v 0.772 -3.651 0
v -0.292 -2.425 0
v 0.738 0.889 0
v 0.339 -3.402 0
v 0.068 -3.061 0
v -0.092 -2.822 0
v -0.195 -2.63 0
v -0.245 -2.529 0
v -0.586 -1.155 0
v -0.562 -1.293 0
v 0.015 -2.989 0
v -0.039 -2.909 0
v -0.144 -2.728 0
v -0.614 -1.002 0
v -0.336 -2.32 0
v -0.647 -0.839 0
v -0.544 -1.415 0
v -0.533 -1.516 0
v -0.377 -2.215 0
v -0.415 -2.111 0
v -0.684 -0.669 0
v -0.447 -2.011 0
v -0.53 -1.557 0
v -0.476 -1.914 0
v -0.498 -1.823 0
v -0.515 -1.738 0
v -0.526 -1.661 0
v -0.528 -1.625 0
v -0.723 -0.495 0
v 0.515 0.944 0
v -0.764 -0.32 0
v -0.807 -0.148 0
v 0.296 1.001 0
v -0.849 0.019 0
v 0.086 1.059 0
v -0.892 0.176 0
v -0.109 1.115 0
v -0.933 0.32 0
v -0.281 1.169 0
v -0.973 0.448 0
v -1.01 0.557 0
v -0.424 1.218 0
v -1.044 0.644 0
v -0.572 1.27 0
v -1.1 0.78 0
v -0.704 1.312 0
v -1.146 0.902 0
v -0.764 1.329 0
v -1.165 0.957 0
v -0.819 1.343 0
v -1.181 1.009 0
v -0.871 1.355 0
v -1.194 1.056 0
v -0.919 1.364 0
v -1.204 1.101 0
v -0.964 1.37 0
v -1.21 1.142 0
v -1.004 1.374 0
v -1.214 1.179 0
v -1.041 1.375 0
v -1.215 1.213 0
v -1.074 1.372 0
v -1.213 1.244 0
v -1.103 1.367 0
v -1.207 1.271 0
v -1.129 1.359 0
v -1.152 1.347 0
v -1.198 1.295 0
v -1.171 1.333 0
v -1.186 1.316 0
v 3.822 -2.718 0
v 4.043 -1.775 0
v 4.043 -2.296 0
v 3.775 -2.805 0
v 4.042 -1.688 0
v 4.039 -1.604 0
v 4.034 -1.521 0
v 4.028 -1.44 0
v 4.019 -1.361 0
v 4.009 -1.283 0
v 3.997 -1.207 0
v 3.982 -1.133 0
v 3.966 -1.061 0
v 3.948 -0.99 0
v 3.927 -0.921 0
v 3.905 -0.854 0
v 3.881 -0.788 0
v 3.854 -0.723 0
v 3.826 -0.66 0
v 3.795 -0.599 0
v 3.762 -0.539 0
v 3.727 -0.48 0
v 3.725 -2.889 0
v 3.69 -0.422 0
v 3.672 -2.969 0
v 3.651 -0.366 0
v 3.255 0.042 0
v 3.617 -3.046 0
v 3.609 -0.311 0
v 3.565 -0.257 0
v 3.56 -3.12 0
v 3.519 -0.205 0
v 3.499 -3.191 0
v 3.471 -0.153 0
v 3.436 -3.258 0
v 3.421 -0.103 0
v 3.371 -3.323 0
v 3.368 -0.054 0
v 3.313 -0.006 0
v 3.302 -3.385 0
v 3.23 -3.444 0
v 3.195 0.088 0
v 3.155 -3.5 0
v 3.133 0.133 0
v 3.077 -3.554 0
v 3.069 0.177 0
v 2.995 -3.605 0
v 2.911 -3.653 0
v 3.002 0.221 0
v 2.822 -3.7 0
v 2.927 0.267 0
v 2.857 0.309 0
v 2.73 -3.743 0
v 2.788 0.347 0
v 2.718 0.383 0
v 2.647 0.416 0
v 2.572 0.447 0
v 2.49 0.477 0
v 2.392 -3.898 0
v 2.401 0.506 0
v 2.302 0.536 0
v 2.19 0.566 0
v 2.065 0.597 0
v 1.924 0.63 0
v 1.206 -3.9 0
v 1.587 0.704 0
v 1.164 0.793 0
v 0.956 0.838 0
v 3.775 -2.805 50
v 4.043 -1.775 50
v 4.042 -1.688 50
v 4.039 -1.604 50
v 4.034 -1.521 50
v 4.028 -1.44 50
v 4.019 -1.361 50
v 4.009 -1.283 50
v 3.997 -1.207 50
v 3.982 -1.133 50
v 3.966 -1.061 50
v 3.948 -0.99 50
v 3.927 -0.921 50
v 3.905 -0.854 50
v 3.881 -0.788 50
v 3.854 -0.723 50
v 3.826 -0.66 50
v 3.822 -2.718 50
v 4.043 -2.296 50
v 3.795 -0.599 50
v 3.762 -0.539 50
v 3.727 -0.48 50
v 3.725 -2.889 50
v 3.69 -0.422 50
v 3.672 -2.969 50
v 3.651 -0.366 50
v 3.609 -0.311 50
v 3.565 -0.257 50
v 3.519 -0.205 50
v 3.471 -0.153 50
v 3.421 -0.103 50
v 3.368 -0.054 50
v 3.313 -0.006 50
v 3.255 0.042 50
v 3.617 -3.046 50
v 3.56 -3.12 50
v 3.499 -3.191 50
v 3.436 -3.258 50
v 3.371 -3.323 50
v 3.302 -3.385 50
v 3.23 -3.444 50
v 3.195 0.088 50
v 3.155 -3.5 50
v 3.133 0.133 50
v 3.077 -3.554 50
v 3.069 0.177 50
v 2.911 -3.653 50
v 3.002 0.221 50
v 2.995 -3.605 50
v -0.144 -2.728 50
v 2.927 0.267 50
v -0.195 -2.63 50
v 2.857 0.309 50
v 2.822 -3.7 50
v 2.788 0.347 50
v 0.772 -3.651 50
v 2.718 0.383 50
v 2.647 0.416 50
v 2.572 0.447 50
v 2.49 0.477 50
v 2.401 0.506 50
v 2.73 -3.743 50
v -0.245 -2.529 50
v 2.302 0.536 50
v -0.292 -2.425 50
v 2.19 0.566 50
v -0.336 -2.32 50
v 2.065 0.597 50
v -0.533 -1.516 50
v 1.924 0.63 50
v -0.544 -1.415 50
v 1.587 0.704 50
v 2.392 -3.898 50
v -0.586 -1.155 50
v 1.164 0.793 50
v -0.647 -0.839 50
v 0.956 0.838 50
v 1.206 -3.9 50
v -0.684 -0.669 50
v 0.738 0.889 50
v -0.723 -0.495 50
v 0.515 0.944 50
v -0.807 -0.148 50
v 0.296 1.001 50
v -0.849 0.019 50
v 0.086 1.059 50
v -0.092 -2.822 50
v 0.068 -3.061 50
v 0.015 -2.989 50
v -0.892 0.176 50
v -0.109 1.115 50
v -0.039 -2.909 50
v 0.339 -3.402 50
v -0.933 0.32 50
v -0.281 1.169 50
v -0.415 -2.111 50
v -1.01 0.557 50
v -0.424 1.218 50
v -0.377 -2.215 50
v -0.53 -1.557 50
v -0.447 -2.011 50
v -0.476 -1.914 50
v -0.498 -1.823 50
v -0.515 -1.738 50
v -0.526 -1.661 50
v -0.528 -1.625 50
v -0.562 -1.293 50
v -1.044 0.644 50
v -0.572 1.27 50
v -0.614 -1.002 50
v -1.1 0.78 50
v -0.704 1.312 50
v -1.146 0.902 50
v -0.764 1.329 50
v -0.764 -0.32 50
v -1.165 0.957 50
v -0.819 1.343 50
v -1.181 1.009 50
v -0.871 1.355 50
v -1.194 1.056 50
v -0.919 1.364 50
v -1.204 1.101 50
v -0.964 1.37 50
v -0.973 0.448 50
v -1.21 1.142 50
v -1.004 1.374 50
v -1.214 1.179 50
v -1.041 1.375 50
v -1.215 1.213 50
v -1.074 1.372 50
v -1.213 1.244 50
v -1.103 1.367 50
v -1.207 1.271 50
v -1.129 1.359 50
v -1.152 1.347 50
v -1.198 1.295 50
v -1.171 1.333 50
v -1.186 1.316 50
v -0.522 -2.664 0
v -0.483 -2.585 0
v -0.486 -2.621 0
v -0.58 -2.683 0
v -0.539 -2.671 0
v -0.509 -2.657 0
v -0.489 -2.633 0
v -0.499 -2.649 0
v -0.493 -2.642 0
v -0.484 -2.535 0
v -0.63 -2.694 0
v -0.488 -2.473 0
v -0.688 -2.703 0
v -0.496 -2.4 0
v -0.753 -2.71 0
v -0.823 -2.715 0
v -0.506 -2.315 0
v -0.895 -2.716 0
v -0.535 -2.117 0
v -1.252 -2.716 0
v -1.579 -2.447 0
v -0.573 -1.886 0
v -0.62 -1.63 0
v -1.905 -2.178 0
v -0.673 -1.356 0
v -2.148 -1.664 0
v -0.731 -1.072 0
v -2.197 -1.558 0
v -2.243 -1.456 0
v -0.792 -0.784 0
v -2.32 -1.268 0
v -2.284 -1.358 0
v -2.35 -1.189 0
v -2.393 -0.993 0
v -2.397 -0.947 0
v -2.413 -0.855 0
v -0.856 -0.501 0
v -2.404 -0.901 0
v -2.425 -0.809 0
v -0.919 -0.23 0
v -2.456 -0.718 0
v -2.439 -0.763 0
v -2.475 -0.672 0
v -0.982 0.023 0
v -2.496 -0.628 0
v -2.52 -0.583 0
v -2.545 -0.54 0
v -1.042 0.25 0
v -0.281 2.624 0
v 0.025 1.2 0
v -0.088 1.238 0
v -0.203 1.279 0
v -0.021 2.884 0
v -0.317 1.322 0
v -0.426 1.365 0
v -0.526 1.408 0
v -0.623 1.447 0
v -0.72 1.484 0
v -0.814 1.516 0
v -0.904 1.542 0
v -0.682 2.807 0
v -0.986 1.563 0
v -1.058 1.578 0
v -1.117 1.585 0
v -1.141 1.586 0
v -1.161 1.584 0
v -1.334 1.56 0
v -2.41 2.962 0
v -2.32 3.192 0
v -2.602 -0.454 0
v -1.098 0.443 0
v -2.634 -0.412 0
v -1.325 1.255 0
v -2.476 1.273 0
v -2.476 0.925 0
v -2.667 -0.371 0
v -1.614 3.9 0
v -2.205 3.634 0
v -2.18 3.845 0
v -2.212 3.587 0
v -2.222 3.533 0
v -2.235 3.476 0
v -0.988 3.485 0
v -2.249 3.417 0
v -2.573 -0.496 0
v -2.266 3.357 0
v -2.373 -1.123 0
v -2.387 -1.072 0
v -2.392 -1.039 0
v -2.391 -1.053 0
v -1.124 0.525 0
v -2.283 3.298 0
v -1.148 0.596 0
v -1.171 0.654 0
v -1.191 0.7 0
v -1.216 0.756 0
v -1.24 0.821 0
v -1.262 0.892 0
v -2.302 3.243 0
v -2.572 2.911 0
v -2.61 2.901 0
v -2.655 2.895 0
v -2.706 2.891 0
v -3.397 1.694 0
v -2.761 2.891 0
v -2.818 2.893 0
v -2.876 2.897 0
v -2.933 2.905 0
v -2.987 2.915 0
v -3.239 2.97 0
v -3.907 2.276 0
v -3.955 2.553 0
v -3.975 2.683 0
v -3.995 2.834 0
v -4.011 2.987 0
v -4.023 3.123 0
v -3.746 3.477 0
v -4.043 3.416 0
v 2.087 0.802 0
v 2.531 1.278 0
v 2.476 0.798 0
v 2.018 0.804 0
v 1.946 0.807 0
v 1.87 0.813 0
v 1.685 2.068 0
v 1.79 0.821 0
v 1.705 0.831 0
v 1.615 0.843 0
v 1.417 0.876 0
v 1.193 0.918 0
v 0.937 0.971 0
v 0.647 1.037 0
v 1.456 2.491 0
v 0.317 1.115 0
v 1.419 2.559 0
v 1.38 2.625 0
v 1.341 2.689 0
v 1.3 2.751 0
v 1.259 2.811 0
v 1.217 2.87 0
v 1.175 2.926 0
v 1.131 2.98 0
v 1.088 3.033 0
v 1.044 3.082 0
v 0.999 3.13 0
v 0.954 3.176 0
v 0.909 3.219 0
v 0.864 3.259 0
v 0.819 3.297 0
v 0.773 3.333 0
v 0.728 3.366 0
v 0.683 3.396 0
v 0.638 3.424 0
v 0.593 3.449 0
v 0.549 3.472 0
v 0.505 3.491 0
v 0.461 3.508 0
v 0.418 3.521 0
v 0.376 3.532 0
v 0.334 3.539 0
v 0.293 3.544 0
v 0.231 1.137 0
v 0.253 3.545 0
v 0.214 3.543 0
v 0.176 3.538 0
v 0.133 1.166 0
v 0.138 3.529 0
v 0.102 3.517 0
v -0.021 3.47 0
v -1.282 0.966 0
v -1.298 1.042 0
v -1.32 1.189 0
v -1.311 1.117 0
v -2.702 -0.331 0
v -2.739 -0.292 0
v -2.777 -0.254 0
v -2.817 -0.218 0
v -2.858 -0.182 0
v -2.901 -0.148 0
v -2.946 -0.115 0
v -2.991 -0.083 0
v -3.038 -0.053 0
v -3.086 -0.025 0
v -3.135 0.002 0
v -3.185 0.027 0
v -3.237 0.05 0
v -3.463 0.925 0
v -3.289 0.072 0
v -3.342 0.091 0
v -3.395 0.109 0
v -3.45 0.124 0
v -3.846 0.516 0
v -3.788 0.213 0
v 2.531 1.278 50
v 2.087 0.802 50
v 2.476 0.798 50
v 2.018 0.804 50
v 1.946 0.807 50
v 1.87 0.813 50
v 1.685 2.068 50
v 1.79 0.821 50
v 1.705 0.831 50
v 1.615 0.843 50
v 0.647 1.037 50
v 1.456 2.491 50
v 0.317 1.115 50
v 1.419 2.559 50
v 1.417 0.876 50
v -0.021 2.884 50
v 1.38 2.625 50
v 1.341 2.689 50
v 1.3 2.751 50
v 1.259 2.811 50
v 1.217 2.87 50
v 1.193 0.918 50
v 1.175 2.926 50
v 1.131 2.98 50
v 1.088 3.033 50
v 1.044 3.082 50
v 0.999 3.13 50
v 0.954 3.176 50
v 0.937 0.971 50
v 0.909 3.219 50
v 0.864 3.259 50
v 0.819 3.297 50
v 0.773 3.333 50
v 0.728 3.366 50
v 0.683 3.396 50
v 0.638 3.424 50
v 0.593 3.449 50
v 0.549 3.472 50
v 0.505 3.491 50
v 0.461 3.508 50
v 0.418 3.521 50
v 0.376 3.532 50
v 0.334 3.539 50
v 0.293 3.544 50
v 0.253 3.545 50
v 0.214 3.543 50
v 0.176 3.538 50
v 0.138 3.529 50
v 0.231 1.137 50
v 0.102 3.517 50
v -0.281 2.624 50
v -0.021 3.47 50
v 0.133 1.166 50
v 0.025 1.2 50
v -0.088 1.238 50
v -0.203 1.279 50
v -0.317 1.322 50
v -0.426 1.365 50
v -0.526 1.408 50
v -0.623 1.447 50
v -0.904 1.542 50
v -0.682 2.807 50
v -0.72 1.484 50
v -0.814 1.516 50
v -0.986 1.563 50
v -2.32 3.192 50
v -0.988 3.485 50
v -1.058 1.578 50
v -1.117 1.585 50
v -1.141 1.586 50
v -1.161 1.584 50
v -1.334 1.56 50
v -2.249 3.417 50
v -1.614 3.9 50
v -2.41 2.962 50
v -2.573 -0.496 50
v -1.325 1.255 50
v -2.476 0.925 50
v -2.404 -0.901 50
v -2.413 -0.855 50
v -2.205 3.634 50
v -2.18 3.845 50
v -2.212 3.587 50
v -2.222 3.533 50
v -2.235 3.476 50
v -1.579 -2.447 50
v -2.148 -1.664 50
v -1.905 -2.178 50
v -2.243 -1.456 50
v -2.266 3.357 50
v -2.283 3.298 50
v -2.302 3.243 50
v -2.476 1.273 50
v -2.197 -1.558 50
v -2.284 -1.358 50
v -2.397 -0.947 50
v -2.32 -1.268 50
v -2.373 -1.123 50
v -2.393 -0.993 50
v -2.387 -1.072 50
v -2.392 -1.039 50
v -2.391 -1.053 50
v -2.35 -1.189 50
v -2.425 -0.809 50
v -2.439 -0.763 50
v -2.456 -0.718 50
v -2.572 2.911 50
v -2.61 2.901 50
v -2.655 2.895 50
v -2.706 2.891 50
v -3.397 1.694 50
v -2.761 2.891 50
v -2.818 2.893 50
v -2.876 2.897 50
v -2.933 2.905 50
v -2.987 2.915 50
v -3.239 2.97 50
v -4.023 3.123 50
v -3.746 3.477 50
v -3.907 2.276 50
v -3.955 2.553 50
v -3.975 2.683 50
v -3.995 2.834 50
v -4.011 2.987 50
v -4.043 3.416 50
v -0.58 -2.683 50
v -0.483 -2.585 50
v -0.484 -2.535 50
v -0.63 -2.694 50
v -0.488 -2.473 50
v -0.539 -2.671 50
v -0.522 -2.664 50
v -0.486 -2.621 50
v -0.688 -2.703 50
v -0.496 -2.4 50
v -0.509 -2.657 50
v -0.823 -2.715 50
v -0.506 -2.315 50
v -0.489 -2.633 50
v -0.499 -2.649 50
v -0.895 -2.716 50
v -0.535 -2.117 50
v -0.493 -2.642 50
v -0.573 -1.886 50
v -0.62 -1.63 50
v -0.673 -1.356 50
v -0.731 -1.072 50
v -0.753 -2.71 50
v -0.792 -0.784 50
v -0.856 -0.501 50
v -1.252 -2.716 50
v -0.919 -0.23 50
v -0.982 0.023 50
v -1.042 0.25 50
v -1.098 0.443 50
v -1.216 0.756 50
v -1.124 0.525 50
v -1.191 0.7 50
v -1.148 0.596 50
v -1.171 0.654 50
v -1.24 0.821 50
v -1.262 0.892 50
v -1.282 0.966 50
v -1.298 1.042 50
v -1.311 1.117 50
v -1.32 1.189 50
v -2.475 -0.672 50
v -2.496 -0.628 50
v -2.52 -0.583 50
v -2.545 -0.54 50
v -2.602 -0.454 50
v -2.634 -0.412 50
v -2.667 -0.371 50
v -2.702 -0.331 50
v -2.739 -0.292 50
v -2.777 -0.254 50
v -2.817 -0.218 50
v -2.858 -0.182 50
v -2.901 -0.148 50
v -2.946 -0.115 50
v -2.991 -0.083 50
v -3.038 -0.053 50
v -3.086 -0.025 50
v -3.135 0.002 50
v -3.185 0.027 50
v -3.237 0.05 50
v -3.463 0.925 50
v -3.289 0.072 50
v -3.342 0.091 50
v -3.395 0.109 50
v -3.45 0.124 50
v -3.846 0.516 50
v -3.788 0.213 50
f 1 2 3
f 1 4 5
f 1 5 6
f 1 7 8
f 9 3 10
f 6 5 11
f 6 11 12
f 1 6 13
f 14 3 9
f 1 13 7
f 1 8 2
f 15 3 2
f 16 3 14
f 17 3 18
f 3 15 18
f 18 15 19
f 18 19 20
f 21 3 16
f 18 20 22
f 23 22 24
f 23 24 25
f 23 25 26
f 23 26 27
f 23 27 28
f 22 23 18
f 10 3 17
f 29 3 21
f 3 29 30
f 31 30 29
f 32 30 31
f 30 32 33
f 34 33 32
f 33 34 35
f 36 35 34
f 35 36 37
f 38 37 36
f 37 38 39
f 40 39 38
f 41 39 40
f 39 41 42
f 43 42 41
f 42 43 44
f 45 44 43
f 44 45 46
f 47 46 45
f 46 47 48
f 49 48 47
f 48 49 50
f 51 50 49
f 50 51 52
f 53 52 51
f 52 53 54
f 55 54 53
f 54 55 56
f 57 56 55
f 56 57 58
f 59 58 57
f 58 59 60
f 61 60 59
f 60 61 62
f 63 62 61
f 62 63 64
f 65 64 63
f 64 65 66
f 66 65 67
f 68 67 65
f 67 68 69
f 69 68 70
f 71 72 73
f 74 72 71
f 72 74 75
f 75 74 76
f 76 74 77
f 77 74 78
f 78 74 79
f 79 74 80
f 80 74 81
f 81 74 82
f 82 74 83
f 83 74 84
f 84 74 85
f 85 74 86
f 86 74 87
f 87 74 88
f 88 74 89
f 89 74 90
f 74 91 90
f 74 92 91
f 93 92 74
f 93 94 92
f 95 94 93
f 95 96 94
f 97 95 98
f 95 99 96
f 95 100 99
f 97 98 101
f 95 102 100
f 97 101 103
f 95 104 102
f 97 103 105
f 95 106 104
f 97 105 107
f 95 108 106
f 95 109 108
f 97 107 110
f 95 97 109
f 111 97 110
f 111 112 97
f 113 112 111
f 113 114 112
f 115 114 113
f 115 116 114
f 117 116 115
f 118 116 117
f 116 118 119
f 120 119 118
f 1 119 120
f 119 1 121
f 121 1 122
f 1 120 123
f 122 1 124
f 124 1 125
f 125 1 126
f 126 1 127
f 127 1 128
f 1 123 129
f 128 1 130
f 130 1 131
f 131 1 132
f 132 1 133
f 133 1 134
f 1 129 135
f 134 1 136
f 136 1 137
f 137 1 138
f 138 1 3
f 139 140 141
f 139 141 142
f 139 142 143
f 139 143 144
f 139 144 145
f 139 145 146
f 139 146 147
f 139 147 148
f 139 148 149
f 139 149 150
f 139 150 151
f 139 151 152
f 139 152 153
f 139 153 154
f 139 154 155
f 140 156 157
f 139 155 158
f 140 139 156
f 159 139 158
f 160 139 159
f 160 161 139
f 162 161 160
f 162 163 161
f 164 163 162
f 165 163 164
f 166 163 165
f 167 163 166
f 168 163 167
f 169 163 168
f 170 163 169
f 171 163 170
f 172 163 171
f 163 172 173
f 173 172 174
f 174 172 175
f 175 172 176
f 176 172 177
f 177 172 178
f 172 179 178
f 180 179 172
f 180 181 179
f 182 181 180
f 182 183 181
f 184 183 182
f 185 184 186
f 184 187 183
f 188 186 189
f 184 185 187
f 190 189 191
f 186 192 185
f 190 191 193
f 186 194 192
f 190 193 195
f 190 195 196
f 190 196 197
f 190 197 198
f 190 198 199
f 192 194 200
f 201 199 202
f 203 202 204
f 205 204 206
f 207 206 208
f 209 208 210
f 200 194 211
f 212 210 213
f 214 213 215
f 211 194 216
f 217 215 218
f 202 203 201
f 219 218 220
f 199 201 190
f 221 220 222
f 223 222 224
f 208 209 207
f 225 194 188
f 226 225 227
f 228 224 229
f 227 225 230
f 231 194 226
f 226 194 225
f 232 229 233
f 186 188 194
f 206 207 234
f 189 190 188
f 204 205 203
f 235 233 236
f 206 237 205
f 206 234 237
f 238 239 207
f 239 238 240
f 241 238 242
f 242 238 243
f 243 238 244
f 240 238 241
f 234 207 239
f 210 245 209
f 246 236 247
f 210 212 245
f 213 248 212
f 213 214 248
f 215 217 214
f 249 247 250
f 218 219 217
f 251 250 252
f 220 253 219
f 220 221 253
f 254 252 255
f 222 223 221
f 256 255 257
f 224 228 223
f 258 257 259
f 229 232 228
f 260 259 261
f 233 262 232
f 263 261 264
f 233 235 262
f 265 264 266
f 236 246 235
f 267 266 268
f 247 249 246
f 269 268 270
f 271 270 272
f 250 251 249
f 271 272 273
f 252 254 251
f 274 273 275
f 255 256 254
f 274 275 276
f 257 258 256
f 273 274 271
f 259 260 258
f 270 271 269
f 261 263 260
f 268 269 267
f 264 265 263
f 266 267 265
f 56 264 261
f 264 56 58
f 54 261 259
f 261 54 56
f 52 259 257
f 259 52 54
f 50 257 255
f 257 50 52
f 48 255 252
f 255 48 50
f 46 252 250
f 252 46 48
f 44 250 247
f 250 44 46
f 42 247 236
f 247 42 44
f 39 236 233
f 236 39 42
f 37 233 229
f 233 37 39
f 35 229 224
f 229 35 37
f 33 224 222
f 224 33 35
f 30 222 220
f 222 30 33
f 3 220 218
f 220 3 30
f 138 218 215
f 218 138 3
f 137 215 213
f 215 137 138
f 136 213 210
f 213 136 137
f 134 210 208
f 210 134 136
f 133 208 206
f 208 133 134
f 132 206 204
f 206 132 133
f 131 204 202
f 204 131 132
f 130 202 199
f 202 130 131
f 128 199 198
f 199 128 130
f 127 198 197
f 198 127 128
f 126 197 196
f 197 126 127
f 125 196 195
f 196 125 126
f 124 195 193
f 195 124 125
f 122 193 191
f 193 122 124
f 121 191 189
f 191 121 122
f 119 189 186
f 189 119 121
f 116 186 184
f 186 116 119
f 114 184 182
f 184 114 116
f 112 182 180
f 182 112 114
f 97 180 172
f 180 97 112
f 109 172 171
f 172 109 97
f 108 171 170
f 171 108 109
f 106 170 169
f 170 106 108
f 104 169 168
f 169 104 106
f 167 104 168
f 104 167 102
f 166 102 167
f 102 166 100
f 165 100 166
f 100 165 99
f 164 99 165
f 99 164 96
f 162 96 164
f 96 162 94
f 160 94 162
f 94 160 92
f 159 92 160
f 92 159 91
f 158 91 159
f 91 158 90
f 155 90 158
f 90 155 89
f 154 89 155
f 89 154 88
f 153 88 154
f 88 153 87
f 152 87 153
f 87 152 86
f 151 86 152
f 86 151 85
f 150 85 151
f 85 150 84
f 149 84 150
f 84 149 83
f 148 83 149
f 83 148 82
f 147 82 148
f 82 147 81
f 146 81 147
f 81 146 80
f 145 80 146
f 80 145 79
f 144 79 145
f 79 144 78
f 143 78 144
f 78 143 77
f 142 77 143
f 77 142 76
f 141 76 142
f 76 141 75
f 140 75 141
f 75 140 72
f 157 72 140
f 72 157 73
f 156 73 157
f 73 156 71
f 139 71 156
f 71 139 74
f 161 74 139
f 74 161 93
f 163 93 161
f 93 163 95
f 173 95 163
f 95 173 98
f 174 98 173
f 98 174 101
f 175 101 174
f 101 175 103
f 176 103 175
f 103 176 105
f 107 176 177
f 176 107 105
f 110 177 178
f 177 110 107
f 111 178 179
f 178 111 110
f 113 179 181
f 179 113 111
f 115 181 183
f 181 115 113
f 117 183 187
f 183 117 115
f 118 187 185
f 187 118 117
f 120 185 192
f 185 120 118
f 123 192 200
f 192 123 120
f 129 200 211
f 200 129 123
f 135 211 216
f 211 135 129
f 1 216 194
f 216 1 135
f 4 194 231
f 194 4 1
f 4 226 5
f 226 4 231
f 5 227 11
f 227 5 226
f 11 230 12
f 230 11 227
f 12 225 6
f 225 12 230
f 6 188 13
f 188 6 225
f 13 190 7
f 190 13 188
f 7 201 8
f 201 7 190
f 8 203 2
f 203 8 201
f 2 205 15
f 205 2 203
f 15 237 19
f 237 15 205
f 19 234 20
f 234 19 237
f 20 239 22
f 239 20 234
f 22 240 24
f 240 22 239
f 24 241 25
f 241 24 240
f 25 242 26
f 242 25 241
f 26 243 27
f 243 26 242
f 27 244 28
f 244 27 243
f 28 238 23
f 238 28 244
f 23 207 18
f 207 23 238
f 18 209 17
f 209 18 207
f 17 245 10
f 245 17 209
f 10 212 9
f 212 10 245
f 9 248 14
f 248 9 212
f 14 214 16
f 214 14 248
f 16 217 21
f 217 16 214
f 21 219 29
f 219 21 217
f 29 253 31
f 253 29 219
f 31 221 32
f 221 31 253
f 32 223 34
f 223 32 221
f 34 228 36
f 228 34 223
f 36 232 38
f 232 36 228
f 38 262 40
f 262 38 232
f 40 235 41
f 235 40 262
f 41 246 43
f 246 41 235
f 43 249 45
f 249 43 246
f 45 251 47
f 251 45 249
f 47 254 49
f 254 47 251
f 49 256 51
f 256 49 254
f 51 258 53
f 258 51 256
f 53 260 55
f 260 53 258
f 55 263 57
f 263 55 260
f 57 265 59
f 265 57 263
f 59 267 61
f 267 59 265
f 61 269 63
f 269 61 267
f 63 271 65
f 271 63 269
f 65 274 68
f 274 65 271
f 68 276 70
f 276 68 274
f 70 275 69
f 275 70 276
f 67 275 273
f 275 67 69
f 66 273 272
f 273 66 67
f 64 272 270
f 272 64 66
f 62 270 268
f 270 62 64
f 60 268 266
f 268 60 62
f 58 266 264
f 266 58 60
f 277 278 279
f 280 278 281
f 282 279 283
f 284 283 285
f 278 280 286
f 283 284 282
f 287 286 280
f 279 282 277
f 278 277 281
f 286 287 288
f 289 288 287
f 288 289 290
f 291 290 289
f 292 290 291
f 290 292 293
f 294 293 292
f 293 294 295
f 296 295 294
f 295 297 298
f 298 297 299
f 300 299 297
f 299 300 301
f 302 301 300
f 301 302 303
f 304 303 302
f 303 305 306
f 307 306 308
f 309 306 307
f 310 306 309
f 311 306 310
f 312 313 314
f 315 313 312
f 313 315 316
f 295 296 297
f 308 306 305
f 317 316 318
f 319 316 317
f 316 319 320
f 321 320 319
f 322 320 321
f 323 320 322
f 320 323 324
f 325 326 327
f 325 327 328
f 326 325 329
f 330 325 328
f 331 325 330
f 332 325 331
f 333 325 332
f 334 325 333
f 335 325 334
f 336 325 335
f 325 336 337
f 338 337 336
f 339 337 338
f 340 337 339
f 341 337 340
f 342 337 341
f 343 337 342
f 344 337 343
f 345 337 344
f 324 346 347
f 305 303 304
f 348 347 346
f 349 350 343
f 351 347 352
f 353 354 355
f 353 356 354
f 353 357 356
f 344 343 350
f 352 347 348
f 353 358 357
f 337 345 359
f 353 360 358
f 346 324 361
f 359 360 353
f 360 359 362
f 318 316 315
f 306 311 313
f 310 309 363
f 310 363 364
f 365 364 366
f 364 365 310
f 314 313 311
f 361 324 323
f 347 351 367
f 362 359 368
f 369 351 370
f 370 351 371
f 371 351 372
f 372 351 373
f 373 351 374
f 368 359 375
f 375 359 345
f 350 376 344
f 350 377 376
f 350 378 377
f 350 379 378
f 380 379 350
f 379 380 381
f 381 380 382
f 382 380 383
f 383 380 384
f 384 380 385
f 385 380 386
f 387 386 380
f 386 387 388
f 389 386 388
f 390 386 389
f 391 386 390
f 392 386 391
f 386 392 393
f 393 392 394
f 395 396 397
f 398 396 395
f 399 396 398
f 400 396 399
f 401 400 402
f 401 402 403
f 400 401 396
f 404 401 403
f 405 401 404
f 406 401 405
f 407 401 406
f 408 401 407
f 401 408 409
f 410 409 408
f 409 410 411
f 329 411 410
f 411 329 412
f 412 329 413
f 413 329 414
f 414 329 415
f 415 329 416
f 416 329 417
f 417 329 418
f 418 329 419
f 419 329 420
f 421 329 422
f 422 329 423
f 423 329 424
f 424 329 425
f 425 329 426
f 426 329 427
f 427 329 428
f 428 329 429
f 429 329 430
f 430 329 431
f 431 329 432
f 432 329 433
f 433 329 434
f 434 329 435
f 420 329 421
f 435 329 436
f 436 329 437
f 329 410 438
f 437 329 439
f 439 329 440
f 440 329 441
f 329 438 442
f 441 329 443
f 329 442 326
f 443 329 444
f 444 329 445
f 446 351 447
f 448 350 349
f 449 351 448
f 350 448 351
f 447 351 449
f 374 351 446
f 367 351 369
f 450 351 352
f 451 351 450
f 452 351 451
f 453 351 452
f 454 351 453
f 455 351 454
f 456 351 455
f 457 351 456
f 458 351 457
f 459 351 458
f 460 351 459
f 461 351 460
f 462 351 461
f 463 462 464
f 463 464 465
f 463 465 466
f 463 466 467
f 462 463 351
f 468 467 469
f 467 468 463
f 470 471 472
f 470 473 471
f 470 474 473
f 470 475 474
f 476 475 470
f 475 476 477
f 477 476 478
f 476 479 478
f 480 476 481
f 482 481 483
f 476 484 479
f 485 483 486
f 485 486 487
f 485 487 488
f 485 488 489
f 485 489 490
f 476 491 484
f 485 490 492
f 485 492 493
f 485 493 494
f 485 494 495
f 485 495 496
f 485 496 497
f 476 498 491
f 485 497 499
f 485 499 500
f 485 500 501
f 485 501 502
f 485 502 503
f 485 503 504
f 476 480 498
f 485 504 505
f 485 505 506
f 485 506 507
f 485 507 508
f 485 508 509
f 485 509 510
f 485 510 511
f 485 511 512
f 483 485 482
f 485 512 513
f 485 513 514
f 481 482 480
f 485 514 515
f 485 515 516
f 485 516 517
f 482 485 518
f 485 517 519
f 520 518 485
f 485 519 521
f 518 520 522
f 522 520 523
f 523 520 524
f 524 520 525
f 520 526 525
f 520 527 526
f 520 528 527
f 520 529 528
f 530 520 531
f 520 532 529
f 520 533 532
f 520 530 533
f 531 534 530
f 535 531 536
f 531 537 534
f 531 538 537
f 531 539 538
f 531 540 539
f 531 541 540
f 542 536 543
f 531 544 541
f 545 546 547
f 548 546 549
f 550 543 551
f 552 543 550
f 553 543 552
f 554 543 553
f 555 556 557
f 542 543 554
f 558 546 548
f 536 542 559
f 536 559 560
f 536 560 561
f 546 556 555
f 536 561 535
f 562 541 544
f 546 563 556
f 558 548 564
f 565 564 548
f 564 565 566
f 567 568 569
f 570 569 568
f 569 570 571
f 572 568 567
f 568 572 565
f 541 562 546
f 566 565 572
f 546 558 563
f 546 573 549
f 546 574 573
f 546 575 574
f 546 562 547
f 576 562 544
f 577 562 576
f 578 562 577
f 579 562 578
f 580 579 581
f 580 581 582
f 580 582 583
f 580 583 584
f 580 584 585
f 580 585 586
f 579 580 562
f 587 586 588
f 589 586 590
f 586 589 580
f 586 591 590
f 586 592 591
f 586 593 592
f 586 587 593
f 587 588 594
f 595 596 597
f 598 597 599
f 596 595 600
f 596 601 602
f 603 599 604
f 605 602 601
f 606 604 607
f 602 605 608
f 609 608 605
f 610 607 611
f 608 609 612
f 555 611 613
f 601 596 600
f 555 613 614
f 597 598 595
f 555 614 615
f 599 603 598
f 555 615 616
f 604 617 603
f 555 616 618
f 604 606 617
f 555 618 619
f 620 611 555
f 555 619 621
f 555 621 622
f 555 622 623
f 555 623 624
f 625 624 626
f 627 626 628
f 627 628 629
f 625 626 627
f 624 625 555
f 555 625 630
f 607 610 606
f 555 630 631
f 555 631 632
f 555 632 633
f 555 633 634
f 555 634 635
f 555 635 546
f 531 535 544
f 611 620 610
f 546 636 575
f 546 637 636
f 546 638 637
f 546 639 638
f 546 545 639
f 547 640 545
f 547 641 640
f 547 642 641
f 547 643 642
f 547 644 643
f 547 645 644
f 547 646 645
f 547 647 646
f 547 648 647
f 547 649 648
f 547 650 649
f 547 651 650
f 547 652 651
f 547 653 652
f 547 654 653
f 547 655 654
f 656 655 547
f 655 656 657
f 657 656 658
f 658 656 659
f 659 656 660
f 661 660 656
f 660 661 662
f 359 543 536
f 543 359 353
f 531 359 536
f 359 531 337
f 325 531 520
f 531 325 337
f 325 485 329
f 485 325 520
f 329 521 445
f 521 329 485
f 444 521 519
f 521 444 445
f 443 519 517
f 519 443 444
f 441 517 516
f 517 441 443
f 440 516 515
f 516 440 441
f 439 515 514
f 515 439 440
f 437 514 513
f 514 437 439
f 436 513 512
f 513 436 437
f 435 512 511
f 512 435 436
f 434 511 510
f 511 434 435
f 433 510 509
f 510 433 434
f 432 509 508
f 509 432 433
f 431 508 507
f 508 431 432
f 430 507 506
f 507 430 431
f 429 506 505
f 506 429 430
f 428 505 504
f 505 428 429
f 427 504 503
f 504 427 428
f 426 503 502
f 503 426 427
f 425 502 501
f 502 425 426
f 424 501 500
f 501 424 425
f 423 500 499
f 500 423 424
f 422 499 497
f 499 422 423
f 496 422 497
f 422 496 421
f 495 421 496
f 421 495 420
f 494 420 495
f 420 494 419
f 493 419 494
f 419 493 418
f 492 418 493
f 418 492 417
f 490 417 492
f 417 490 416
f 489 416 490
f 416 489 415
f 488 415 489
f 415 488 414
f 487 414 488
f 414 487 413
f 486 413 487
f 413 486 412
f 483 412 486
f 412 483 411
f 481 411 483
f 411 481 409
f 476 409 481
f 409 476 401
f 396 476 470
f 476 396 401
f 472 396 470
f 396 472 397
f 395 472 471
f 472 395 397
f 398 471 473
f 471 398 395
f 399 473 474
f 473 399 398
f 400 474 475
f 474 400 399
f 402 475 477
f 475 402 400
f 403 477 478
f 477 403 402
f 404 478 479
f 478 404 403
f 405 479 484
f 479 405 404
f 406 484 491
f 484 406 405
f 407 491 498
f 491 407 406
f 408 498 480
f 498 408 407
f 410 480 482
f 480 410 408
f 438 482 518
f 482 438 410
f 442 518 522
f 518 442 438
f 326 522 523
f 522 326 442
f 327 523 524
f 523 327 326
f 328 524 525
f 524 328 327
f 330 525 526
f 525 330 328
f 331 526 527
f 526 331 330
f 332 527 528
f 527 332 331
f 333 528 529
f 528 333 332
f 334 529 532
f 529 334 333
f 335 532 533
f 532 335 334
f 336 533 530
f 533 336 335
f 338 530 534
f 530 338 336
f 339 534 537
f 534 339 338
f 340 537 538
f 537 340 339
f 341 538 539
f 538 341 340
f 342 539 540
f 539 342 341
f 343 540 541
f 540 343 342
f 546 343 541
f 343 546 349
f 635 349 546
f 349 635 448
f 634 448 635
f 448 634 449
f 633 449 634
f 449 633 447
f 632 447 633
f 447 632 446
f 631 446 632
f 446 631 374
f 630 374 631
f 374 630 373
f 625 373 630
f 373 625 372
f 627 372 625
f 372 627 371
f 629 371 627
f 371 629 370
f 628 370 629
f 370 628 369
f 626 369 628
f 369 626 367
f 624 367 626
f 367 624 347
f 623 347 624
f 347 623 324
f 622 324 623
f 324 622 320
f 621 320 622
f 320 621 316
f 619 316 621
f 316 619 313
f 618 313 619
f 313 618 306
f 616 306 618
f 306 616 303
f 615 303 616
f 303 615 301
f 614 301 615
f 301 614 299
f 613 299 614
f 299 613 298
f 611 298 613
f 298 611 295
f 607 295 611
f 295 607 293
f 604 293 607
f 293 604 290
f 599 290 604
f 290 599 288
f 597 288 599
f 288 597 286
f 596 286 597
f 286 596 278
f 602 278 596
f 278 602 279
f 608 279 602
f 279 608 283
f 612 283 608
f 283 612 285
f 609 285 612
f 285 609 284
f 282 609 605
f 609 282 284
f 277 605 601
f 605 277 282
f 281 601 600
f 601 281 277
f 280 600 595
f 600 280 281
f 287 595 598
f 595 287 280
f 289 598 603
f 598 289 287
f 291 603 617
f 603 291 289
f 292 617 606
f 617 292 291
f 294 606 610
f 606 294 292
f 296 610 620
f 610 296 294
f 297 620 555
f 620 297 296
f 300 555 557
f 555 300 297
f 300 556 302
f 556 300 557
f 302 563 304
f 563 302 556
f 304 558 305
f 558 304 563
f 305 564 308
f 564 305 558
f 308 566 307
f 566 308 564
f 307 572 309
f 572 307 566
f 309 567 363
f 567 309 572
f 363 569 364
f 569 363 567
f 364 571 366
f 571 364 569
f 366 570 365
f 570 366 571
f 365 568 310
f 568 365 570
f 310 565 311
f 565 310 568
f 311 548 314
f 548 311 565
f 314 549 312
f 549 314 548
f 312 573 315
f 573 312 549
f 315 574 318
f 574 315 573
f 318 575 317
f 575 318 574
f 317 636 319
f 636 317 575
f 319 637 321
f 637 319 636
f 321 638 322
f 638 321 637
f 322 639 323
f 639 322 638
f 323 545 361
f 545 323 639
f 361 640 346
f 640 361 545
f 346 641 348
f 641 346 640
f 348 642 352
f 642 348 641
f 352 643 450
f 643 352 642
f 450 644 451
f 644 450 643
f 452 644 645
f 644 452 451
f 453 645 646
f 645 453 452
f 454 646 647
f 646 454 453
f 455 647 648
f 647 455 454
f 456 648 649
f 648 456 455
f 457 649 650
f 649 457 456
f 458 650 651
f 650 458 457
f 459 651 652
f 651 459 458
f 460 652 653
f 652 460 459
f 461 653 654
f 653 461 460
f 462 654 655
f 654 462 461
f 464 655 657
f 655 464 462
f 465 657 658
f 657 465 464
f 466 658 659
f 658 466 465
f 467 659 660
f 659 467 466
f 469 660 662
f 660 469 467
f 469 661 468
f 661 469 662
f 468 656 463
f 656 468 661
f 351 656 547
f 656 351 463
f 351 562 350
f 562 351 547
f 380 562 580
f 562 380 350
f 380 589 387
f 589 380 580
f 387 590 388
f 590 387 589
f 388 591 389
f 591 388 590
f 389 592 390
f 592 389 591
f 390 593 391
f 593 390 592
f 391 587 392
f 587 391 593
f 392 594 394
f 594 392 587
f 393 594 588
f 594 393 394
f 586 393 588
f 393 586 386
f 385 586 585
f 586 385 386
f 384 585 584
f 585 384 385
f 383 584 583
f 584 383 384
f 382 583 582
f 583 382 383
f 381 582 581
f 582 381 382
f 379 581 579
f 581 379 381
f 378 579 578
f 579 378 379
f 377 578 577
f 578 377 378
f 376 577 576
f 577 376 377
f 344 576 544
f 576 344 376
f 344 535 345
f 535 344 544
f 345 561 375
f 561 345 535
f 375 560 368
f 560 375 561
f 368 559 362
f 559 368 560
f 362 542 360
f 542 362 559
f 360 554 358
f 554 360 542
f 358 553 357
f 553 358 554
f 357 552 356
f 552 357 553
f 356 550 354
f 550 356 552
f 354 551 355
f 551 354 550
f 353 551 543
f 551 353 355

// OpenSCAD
// Generated by inkscape None + inkscape-paths2openscad 0.27
// Sat Sep 26 10:12:09 2020 from "inkscape.svg"

// Module names are of the form poly_<inkscape-path-id>().  As a result,
// you can associate a polygon in this OpenSCAD program with the corresponding
// SVG element in the Inkscape document by looking for the XML element with
// the attribute id="inkscape-path-id".

// fudge value is used to ensure that subtracted solids are a tad taller
// in the z dimension than the polygon being subtracted from.  This helps
// keep the resulting .stl file manifold.
fudge = 0.1;
user_unit_scale_x = 1.0;
user_unit_scale_y = 1.0;
custom_scale_x = 1;
custom_scale_y = 1;
zsize = 50;
line_fn = 16;
min_line_width = 1.0;
line_width_scale = 1.0;
function min_line_mm(w) = max(min_line_width, w * line_width_scale) * 1;


path969_0_center = [1.413849,1.262593];
path969_0_points = [[0.772505,3.650979],[0.338515,3.402059],[0.068165,3.060709],[0.014932,2.989187],[-0.038559,2.909125],[-0.091797,2.821775],[-0.144273,2.728388],[-0.195479,2.630216],[-0.244904,2.528512],[-0.292039,2.424528],[-0.336375,2.319514],[-0.377403,2.214724],[-0.414613,2.111408],[-0.447496,2.010820],[-0.475542,1.914210],[-0.498242,1.822831],[-0.515088,1.737935],[-0.525568,1.660774],[-0.528263,1.625485],[-0.529175,1.592599],[-0.530170,1.557299],[-0.533093,1.515624],[-0.544339,1.414802],[-0.562150,1.293449],[-0.585762,1.154881],[-0.614413,1.002414],[-0.647340,0.839363],[-0.683778,0.669043],[-0.722966,0.494771],[-0.764140,0.319861],[-0.806538,0.147631],[-0.849395,-0.018606],[-0.891950,-0.175532],[-0.933438,-0.319833],[-0.973097,-0.448193],[-1.010164,-0.557296],[-1.043875,-0.643826],[-1.100453,-0.780448],[-1.146190,-0.901911],[-1.164868,-0.957072],[-1.180686,-1.008583],[-1.193594,-1.056489],[-1.203542,-1.100836],[-1.210480,-1.141670],[-1.214358,-1.179039],[-1.215127,-1.212988],[-1.212735,-1.243563],[-1.207133,-1.270811],[-1.198272,-1.294779],[-1.186102,-1.315511],[-1.170571,-1.333056],[-1.151631,-1.347458],[-1.129232,-1.358765],[-1.103323,-1.367022],[-1.073855,-1.372277],[-1.040777,-1.374574],[-1.004041,-1.373961],[-0.963595,-1.370483],[-0.919390,-1.364188],[-0.871375,-1.355120],[-0.819502,-1.343328],[-0.763720,-1.328856],[-0.703978,-1.311752],[-0.572419,-1.269829],[-0.424425,-1.217931],[-0.281027,-1.168968],[-0.108833,-1.115333],[0.085640,-1.058767],[0.295877,-1.001014],[0.515363,-0.943816],[0.737582,-0.888917],[0.956018,-0.838060],[1.164155,-0.792987],[1.587508,-0.704192],[1.924360,-0.630036],[2.065219,-0.596930],[2.190297,-0.565664],[2.301542,-0.535631],[2.400902,-0.506224],[2.490327,-0.476837],[2.571763,-0.446862],[2.647159,-0.415692],[2.718463,-0.382722],[2.787624,-0.347345],[2.856589,-0.308953],[2.927307,-0.266940],[3.001725,-0.220699],[3.068668,-0.177252],[3.133211,-0.132931],[3.195372,-0.087701],[3.255168,-0.041527],[3.312618,0.005626],[3.367740,0.053791],[3.420551,0.103005],[3.471070,0.153300],[3.519316,0.204712],[3.565305,0.257276],[3.609056,0.311026],[3.650587,0.365996],[3.689917,0.422222],[3.727062,0.479738],[3.762042,0.538578],[3.794874,0.598777],[3.825576,0.660369],[3.854167,0.723390],[3.880664,0.787874],[3.905085,0.853856],[3.927450,0.921369],[3.947774,0.990449],[3.966078,1.061130],[3.982378,1.133447],[3.996692,1.207435],[4.009040,1.283128],[4.019438,1.360560],[4.027906,1.439767],[4.034460,1.520783],[4.039119,1.603642],[4.041902,1.688379],[4.042825,1.775029],[4.042825,2.295929],[3.822345,2.717599],[3.774676,2.804818],[3.724663,2.888582],[3.672219,2.968971],[3.617259,3.046066],[3.559699,3.119947],[3.499452,3.190693],[3.436435,3.258385],[3.370560,3.323103],[3.301744,3.384926],[3.229900,3.443936],[3.154944,3.500211],[3.076791,3.553833],[2.995354,3.604880],[2.910550,3.653434],[2.822292,3.699573],[2.730495,3.743379],[2.391825,3.897759],[1.799155,3.898759],[1.206495,3.899759],[0.772505,3.650849],[0.772505,3.650979]];
path969_1_center = [-0.755675,-0.591815];
path969_1_points = [[-1.578885,2.447189],[-1.905185,2.178229],[-2.148445,1.664019],[-2.197311,1.558472],[-2.242902,1.455647],[-2.284220,1.358105],[-2.320266,1.268409],[-2.350043,1.189121],[-2.372552,1.122804],[-2.386795,1.072019],[-2.390506,1.053252],[-2.391775,1.039329],[-2.393179,0.993345],[-2.397289,0.947252],[-2.404039,0.901122],[-2.413364,0.855029],[-2.425195,0.809046],[-2.439468,0.763246],[-2.456115,0.717701],[-2.475071,0.672485],[-2.496268,0.627671],[-2.519641,0.583332],[-2.545122,0.539541],[-2.572646,0.496371],[-2.602146,0.453895],[-2.633556,0.412186],[-2.666809,0.371317],[-2.701839,0.331361],[-2.738579,0.292392],[-2.776963,0.254481],[-2.816925,0.217703],[-2.858399,0.182131],[-2.901316,0.147836],[-2.945613,0.114893],[-2.991221,0.083375],[-3.038075,0.053354],[-3.086108,0.024903],[-3.135253,-0.001903],[-3.185445,-0.026994],[-3.236617,-0.050294],[-3.288702,-0.071732],[-3.341635,-0.091235],[-3.395348,-0.108728],[-3.449775,-0.124140],[-3.788045,-0.212760],[-3.817245,-0.364527],[-3.846445,-0.516295],[-3.654685,-0.720408],[-3.462935,-0.924522],[-2.969685,-0.924522],[-2.476445,-0.924522],[-2.476445,-1.098538],[-2.476445,-1.272555],[-2.936565,-1.483202],[-3.396675,-1.693849],[-3.652055,-1.984708],[-3.907425,-2.275567],[-3.955025,-2.552544],[-3.975095,-2.683212],[-3.994537,-2.834242],[-4.011148,-2.986929],[-4.022725,-3.122570],[-4.042825,-3.415619],[-3.894395,-3.446329],[-3.745975,-3.477039],[-3.492505,-3.223570],[-3.239035,-2.970100],[-2.986665,-2.914670],[-2.932661,-2.904585],[-2.875883,-2.897207],[-2.818030,-2.892551],[-2.760804,-2.890635],[-2.705904,-2.891473],[-2.655030,-2.895081],[-2.609884,-2.901475],[-2.572165,-2.910670],[-2.410035,-2.962130],[-2.320235,-3.192148],[-2.301679,-3.242674],[-2.283377,-3.298161],[-2.265800,-3.356798],[-2.249419,-3.416775],[-2.234706,-3.476277],[-2.222134,-3.533496],[-2.212173,-3.586618],[-2.205295,-3.633832],[-2.180195,-3.845499],[-1.897035,-3.872629],[-1.613875,-3.899759],[-1.300755,-3.692549],[-0.987645,-3.485338],[-0.834615,-3.145985],[-0.681585,-2.806633],[-0.481295,-2.715373],[-0.281015,-2.624113],[-0.151105,-2.754021],[-0.021195,-2.883928],[-0.021195,-3.176892],[-0.021195,-3.469835],[0.102315,-3.517235],[0.138401,-3.529155],[0.175597,-3.537699],[0.213832,-3.542922],[0.253036,-3.544877],[0.293139,-3.543618],[0.334068,-3.539198],[0.375753,-3.531672],[0.418124,-3.521093],[0.461109,-3.507514],[0.504638,-3.490989],[0.548640,-3.471573],[0.593044,-3.449318],[0.637779,-3.424279],[0.682774,-3.396508],[0.727959,-3.366061],[0.773262,-3.332989],[0.818614,-3.297348],[0.863943,-3.259191],[0.909177,-3.218572],[0.954247,-3.175543],[0.999082,-3.130160],[1.043610,-3.082475],[1.087762,-3.032542],[1.131465,-2.980415],[1.174650,-2.926148],[1.217244,-2.869794],[1.259179,-2.811408],[1.300382,-2.751042],[1.340783,-2.688750],[1.380311,-2.624587],[1.418895,-2.558605],[1.456465,-2.490859],[1.684995,-2.067526],[2.108235,-1.672736],[2.531475,-1.277947],[2.503975,-1.037736],[2.476475,-0.797526],[2.087415,-0.802026],[2.018136,-0.803758],[1.945742,-0.807440],[1.869721,-0.813163],[1.789559,-0.821017],[1.704740,-0.831094],[1.614752,-0.843484],[1.417211,-0.875566],[1.192825,-0.917990],[0.937481,-0.971484],[0.647068,-1.036773],[0.317475,-1.114584],[0.231492,-1.137100],[0.133013,-1.166048],[0.025501,-1.200226],[-0.087585,-1.238433],[-0.202782,-1.279467],[-0.316628,-1.322127],[-0.425663,-1.365211],[-0.526425,-1.407518],[-0.622926,-1.447451],[-0.719743,-1.483733],[-0.814271,-1.515639],[-0.903906,-1.542445],[-0.986044,-1.563425],[-1.058079,-1.577856],[-1.117408,-1.585013],[-1.141493,-1.585637],[-1.161425,-1.584171],[-1.333525,-1.559531],[-1.324525,-1.254972],[-1.320171,-1.188677],[-1.311217,-1.116941],[-1.298200,-1.042042],[-1.281659,-0.966256],[-1.262130,-0.891861],[-1.240151,-0.821133],[-1.216261,-0.756350],[-1.190995,-0.699789],[-1.170554,-0.654167],[-1.148109,-0.595588],[-1.123851,-0.524968],[-1.097973,-0.443223],[-1.042119,-0.250026],[-0.982079,-0.023328],[-0.919385,0.229541],[-0.855569,0.501250],[-0.792162,0.784468],[-0.730698,1.071864],[-0.672707,1.356107],[-0.619721,1.629866],[-0.573273,1.885810],[-0.534895,2.116609],[-0.506118,2.314931],[-0.495809,2.399623],[-0.488474,2.473446],[-0.484306,2.535484],[-0.483496,2.584822],[-0.486235,2.620542],[-0.488996,2.633010],[-0.492715,2.641729],[-0.499251,2.649305],[-0.509235,2.656669],[-0.522460,2.663783],[-0.538720,2.670609],[-0.579518,2.683243],[-0.629978,2.694266],[-0.688448,2.703373],[-0.753279,2.710256],[-0.822818,2.714610],[-0.895415,2.716129],[-1.252125,2.716129],[-1.578885,2.447189]];
module poly_path969(h, w, s, res=line_fn)
{
  scale([custom_scale_x, -custom_scale_y, 1]) union()
  {
    translate (path969_0_center) linear_extrude(height=h, convexity=10, scale=0.01*s)
      translate (-path969_0_center) polygon(path969_0_points);
    translate (path969_1_center) linear_extrude(height=h, convexity=10, scale=0.01*s)
      translate (-path969_1_center) polygon(path969_1_points);
  }
}

module wound(h)
{
  difference()
  {
    union()
    {
      translate ([0,0,0]) poly_path969(h, min_line_mm(0.999998), 100.0);
    }
    union()
    {
    }
  }
}

wound(zsize);
